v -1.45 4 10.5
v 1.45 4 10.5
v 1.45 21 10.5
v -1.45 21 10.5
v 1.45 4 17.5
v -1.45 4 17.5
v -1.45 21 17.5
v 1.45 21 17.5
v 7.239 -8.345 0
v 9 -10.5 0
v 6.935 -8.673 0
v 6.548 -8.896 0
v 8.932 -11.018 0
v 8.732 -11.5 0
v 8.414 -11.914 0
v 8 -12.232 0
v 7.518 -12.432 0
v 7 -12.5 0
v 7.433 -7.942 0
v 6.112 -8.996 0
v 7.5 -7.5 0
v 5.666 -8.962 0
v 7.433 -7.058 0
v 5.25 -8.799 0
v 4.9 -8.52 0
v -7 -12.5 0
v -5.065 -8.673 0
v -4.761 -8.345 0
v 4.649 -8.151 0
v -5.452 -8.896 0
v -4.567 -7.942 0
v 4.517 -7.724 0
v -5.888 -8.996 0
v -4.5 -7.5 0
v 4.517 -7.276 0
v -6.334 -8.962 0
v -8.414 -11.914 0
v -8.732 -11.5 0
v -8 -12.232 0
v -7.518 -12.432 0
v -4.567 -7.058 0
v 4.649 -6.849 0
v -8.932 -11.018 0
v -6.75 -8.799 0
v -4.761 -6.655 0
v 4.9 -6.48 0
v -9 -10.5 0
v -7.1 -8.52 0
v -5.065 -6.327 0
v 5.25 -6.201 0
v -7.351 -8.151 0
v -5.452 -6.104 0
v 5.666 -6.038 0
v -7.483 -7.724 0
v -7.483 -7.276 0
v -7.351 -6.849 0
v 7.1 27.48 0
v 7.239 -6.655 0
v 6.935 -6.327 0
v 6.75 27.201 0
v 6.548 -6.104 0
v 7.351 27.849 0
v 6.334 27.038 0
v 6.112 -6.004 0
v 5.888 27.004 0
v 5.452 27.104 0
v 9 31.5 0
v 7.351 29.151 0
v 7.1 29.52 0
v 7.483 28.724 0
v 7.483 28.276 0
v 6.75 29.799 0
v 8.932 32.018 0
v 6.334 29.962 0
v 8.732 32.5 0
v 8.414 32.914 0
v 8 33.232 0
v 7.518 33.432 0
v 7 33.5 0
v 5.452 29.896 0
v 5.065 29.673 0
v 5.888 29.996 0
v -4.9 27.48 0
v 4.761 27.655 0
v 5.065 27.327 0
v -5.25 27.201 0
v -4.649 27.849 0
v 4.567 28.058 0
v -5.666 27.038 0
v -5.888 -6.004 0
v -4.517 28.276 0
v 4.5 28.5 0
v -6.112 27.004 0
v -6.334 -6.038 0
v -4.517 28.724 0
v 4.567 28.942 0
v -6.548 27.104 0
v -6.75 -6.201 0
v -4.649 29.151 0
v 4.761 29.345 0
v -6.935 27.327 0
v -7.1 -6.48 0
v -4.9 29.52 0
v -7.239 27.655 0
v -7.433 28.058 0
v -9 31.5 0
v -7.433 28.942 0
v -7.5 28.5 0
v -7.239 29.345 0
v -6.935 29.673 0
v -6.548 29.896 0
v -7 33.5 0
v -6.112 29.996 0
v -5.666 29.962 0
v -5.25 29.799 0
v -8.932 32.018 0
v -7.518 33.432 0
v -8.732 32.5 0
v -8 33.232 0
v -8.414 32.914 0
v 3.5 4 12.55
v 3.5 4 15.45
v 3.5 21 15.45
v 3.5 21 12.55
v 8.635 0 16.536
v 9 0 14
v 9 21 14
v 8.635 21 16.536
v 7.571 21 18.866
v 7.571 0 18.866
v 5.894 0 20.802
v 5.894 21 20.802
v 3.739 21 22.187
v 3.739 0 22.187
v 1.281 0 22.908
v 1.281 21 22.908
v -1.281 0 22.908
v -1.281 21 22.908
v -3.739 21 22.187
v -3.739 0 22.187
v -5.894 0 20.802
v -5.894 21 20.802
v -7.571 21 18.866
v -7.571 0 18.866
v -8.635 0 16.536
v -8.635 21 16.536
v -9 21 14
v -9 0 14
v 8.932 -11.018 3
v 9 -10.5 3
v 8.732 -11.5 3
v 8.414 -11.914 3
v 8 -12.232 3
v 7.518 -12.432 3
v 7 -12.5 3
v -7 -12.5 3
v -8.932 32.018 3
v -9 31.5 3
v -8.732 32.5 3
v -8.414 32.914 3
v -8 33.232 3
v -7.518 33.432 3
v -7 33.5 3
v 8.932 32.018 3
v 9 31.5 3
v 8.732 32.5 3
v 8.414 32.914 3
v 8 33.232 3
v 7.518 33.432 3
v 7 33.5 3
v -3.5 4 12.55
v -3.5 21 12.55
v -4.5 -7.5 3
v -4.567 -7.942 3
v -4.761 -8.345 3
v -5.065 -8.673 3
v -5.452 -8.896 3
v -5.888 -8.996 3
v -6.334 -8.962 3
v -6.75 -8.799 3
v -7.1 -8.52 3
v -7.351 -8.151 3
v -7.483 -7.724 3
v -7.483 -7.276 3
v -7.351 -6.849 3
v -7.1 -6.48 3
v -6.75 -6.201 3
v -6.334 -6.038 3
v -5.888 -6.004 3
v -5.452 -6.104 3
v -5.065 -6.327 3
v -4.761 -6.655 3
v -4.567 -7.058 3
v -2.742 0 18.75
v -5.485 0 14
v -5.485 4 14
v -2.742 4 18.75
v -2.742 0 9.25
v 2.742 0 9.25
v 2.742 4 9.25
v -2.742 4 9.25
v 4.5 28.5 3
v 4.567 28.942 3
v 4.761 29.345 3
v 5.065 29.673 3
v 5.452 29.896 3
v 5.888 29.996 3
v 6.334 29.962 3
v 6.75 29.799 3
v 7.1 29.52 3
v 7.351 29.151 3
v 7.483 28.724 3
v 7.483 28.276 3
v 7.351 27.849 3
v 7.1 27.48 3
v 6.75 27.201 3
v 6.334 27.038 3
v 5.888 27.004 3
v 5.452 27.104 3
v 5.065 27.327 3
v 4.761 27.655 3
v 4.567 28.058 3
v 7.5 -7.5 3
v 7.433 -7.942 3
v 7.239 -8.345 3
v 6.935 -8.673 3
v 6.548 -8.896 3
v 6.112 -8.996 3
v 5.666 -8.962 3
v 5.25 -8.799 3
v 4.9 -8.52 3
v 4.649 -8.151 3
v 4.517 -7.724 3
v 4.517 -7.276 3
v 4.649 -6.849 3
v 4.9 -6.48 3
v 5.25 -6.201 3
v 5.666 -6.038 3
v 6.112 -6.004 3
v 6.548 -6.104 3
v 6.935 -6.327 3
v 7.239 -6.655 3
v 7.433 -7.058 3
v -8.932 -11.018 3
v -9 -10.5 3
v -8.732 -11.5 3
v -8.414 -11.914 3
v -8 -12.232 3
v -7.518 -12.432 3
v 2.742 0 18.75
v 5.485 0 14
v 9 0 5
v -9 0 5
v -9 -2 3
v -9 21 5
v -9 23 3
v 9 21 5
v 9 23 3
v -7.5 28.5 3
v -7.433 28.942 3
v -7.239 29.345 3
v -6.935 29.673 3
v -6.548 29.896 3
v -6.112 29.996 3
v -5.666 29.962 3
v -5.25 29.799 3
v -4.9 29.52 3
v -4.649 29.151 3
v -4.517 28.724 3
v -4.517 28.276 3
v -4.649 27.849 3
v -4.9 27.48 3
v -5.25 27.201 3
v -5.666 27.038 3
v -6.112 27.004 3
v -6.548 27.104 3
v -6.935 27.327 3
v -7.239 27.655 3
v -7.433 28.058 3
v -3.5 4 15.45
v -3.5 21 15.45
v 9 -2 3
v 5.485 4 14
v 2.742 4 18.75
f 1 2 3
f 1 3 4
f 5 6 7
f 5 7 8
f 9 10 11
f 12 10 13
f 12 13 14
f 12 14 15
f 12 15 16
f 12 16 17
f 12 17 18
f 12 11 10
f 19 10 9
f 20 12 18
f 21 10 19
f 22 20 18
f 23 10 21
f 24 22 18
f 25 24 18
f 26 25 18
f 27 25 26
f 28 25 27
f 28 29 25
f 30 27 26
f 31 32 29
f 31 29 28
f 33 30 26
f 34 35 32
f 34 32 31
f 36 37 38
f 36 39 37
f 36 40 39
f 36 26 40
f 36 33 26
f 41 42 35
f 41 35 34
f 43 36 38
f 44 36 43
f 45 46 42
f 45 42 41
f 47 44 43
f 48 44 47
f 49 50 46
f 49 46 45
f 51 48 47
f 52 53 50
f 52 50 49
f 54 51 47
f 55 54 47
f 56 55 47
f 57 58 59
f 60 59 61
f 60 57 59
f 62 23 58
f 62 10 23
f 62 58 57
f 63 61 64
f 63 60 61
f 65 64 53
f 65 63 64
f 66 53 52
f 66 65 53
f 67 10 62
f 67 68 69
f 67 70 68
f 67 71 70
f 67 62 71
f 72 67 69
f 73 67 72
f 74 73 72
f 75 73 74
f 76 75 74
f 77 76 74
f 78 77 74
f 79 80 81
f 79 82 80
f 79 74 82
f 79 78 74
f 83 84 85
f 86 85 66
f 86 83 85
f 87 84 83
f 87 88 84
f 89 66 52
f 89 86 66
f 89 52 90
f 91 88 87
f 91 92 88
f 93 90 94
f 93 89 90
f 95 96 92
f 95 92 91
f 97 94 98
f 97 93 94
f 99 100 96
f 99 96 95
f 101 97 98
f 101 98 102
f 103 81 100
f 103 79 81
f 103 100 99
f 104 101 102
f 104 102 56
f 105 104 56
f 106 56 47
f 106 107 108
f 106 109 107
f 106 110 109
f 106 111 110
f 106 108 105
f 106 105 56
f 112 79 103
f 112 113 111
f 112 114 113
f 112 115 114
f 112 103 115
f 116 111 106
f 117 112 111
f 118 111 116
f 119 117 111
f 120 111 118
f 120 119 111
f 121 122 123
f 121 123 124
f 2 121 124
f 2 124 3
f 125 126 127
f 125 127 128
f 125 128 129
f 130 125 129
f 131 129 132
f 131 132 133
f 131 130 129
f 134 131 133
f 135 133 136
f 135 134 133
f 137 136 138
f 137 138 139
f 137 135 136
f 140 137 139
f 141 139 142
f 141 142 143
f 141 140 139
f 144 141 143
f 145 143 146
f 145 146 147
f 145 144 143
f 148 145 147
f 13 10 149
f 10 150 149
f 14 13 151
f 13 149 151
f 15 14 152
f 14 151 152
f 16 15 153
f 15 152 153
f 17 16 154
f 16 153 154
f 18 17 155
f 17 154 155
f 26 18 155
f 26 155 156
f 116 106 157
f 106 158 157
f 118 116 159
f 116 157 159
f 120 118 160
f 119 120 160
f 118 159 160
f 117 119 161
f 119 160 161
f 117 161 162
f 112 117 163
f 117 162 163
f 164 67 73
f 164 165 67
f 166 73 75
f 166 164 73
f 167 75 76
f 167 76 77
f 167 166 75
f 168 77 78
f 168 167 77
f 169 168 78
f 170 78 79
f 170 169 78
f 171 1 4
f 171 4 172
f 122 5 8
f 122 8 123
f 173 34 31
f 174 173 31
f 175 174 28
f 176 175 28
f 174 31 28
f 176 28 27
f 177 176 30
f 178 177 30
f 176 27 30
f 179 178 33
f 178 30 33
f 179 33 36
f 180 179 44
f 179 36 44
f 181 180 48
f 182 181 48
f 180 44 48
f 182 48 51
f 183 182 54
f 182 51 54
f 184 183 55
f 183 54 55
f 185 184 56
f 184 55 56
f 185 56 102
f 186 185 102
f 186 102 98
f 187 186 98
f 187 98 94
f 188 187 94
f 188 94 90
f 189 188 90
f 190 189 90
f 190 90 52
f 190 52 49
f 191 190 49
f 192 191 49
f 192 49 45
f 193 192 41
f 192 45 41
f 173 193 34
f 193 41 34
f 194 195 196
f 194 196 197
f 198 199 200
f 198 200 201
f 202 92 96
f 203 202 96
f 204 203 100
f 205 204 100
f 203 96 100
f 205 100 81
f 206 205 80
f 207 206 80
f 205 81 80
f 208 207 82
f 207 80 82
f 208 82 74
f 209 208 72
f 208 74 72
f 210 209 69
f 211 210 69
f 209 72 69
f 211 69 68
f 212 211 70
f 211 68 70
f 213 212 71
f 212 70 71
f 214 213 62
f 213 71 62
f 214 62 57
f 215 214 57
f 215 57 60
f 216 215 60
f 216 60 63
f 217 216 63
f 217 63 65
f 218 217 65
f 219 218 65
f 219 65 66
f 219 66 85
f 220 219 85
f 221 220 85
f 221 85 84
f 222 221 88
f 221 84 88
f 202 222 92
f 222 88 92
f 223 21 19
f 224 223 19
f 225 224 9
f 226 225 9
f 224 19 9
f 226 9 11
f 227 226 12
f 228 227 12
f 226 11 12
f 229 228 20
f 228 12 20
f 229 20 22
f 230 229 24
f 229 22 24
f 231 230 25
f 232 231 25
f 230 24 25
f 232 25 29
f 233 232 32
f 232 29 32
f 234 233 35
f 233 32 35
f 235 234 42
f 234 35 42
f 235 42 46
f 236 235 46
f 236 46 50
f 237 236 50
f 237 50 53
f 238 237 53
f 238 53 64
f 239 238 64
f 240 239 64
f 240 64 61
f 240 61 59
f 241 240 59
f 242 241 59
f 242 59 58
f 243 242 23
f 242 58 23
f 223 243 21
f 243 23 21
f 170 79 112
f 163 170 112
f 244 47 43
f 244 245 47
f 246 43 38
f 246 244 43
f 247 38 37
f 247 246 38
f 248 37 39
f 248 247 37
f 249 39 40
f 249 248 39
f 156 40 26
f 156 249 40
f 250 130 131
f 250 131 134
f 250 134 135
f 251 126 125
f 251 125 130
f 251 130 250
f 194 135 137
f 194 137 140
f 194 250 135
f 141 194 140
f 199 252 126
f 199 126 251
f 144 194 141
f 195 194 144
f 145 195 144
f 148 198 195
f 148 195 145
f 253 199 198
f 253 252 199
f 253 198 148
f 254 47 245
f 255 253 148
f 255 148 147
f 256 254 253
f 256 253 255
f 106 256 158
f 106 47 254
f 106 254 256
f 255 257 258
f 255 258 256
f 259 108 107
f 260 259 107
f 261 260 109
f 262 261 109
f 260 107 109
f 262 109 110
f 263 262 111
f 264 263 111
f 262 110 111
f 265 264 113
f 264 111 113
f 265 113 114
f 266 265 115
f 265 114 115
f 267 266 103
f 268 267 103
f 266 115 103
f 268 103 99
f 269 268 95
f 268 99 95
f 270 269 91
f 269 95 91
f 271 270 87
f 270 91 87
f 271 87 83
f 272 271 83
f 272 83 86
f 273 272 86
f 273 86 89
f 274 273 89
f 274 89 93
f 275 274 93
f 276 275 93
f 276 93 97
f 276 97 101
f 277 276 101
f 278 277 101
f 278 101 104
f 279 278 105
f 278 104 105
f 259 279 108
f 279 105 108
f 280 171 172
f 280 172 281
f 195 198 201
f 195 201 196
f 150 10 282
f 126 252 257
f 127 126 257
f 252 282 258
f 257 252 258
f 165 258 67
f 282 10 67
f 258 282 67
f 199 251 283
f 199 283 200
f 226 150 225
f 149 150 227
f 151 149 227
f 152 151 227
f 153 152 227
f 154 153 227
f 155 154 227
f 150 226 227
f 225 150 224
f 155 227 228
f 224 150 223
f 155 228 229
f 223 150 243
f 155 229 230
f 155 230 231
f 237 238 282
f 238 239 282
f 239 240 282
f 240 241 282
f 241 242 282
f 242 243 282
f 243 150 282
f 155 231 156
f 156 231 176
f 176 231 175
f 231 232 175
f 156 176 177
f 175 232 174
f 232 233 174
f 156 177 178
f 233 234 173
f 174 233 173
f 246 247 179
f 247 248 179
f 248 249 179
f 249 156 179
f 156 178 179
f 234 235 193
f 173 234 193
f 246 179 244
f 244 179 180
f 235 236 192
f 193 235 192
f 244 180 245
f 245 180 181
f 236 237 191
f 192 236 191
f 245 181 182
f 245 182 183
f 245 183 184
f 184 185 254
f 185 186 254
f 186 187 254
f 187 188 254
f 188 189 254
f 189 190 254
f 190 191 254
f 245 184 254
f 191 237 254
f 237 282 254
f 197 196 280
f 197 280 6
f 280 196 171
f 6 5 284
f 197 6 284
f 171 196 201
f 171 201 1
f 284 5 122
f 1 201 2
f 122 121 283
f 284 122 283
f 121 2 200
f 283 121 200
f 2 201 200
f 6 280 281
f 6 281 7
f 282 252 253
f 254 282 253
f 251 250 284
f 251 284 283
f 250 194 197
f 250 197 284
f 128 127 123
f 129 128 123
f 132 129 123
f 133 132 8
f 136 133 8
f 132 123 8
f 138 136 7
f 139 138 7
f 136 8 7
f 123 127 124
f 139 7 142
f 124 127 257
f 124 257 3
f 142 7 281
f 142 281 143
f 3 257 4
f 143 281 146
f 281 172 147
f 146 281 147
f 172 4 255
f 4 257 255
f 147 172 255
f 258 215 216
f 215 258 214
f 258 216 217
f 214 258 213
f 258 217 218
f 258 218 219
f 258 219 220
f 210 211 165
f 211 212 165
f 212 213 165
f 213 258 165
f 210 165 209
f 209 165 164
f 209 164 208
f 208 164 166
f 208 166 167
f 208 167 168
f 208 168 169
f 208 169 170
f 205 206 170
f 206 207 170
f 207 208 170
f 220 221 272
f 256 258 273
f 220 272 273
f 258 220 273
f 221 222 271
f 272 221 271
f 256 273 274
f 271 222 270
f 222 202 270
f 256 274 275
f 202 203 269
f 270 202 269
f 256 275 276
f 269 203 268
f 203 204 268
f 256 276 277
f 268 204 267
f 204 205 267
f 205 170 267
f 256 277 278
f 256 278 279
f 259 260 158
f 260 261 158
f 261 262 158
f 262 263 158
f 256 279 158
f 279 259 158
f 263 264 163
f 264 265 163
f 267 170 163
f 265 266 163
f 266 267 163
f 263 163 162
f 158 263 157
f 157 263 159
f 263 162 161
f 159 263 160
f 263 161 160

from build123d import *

# Parameters (mm, degrees)
BOSS_EXTRUDE1_DEPTH = 21
BOSS_EXTRUDE2_START = -17
SKETCH2_R           = 9
BOSS_EXTRUDE2_DEPTH = 17
SKETCH4_W           = 18
SKETCH4_H           = 12.5
SKETCH4_R           = 1.5
BOSS_EXTRUDE3_DEPTH = 3
FILLET1_R           = 2
CHAMFER1_SIZE       = 2


with BuildPart() as part:
    # Sketch1 → Boss-Extrude1 (new body)
    with BuildSketch(Plane(origin=(0, 0, 0), x_dir=(1, 0, 0), z_dir=(0, 1, 0))):
        with BuildLine():
            Line((-9, 0), (9, 0))
            Line((9, 0), (9, -14))
            ThreePointArc((9, -14), (0, -23), (-9, -14))
            Line((-9, -14), (-9, 0))
        make_face()
        Polygon((-2.742413779, -9.25), (-5.484827557, -14), (-2.742413779, -18.75), (2.742413779, -18.75), (5.484827557, -14), (2.742413779, -9.25), align=None, mode=Mode.SUBTRACT)
    extrude(amount=BOSS_EXTRUDE1_DEPTH)

    # Sketch2 → Boss-Extrude2 (add)
    with BuildSketch(Plane(origin=(0, 21, 0), x_dir=(1, 0, 0), z_dir=(0, 1, 0)).offset(BOSS_EXTRUDE2_START)):
        with Locations((0, -14)):
            Circle(SKETCH2_R)
        Polygon((3.5, -12.550252532), (1.449747468, -10.5), (-1.449747468, -10.5), (-3.5, -12.550252532), (-3.5, -15.449747468), (-1.449747468, -17.5), (1.449747468, -17.5), (3.5, -15.449747468), align=None, mode=Mode.SUBTRACT)
    extrude(amount=BOSS_EXTRUDE2_DEPTH)

    # Sketch4 → Boss-Extrude3 (add)
    # profile 1 of 2: a face of its own
    with BuildSketch(Plane(origin=(0, 0, 0), x_dir=(-1, 0, 0), z_dir=(0, 0, -1))):
        with Locations((0, 27.25)):
            Rectangle(SKETCH4_W, SKETCH4_H)
        with Locations((-6, 28.5)):
            Circle(SKETCH4_R, mode=Mode.SUBTRACT)
        with Locations((6, 28.5)):
            Circle(SKETCH4_R, mode=Mode.SUBTRACT)
    # profile 2 of 2: a face of its own
    with BuildSketch(Plane(origin=(0, 0, 0), x_dir=(-1, 0, 0), z_dir=(0, 0, -1))):
        with Locations((0, -6.25)):
            Rectangle(SKETCH4_W, SKETCH4_H)
        with Locations(Location((6, -7.5, 0), (0, 0, 180))):
            Circle(SKETCH4_R, mode=Mode.SUBTRACT)
        with Locations(Location((-6, -7.5, 0), (0, 0, 180))):
            Circle(SKETCH4_R, mode=Mode.SUBTRACT)
    extrude(amount=-BOSS_EXTRUDE3_DEPTH)

    # Fillet1
    fillet1_edges = [part.edges().sort_by_distance(p)[0] for p in [
        (9, 33.5, 1.5),
        (-9, 33.5, 1.5),
        (-9, -12.5, 1.5),
        (9, -12.5, 1.5),
    ]]
    fillet(fillet1_edges, radius=FILLET1_R)

    # Chamfer1
    chamfer1_edges = [part.edges().sort_by_distance(p)[0] for p in [
        (0, 21, 3),
        (0, 0, 3),
    ]]
    chamfer(chamfer1_edges, length=CHAMFER1_SIZE)


solid = part.part
